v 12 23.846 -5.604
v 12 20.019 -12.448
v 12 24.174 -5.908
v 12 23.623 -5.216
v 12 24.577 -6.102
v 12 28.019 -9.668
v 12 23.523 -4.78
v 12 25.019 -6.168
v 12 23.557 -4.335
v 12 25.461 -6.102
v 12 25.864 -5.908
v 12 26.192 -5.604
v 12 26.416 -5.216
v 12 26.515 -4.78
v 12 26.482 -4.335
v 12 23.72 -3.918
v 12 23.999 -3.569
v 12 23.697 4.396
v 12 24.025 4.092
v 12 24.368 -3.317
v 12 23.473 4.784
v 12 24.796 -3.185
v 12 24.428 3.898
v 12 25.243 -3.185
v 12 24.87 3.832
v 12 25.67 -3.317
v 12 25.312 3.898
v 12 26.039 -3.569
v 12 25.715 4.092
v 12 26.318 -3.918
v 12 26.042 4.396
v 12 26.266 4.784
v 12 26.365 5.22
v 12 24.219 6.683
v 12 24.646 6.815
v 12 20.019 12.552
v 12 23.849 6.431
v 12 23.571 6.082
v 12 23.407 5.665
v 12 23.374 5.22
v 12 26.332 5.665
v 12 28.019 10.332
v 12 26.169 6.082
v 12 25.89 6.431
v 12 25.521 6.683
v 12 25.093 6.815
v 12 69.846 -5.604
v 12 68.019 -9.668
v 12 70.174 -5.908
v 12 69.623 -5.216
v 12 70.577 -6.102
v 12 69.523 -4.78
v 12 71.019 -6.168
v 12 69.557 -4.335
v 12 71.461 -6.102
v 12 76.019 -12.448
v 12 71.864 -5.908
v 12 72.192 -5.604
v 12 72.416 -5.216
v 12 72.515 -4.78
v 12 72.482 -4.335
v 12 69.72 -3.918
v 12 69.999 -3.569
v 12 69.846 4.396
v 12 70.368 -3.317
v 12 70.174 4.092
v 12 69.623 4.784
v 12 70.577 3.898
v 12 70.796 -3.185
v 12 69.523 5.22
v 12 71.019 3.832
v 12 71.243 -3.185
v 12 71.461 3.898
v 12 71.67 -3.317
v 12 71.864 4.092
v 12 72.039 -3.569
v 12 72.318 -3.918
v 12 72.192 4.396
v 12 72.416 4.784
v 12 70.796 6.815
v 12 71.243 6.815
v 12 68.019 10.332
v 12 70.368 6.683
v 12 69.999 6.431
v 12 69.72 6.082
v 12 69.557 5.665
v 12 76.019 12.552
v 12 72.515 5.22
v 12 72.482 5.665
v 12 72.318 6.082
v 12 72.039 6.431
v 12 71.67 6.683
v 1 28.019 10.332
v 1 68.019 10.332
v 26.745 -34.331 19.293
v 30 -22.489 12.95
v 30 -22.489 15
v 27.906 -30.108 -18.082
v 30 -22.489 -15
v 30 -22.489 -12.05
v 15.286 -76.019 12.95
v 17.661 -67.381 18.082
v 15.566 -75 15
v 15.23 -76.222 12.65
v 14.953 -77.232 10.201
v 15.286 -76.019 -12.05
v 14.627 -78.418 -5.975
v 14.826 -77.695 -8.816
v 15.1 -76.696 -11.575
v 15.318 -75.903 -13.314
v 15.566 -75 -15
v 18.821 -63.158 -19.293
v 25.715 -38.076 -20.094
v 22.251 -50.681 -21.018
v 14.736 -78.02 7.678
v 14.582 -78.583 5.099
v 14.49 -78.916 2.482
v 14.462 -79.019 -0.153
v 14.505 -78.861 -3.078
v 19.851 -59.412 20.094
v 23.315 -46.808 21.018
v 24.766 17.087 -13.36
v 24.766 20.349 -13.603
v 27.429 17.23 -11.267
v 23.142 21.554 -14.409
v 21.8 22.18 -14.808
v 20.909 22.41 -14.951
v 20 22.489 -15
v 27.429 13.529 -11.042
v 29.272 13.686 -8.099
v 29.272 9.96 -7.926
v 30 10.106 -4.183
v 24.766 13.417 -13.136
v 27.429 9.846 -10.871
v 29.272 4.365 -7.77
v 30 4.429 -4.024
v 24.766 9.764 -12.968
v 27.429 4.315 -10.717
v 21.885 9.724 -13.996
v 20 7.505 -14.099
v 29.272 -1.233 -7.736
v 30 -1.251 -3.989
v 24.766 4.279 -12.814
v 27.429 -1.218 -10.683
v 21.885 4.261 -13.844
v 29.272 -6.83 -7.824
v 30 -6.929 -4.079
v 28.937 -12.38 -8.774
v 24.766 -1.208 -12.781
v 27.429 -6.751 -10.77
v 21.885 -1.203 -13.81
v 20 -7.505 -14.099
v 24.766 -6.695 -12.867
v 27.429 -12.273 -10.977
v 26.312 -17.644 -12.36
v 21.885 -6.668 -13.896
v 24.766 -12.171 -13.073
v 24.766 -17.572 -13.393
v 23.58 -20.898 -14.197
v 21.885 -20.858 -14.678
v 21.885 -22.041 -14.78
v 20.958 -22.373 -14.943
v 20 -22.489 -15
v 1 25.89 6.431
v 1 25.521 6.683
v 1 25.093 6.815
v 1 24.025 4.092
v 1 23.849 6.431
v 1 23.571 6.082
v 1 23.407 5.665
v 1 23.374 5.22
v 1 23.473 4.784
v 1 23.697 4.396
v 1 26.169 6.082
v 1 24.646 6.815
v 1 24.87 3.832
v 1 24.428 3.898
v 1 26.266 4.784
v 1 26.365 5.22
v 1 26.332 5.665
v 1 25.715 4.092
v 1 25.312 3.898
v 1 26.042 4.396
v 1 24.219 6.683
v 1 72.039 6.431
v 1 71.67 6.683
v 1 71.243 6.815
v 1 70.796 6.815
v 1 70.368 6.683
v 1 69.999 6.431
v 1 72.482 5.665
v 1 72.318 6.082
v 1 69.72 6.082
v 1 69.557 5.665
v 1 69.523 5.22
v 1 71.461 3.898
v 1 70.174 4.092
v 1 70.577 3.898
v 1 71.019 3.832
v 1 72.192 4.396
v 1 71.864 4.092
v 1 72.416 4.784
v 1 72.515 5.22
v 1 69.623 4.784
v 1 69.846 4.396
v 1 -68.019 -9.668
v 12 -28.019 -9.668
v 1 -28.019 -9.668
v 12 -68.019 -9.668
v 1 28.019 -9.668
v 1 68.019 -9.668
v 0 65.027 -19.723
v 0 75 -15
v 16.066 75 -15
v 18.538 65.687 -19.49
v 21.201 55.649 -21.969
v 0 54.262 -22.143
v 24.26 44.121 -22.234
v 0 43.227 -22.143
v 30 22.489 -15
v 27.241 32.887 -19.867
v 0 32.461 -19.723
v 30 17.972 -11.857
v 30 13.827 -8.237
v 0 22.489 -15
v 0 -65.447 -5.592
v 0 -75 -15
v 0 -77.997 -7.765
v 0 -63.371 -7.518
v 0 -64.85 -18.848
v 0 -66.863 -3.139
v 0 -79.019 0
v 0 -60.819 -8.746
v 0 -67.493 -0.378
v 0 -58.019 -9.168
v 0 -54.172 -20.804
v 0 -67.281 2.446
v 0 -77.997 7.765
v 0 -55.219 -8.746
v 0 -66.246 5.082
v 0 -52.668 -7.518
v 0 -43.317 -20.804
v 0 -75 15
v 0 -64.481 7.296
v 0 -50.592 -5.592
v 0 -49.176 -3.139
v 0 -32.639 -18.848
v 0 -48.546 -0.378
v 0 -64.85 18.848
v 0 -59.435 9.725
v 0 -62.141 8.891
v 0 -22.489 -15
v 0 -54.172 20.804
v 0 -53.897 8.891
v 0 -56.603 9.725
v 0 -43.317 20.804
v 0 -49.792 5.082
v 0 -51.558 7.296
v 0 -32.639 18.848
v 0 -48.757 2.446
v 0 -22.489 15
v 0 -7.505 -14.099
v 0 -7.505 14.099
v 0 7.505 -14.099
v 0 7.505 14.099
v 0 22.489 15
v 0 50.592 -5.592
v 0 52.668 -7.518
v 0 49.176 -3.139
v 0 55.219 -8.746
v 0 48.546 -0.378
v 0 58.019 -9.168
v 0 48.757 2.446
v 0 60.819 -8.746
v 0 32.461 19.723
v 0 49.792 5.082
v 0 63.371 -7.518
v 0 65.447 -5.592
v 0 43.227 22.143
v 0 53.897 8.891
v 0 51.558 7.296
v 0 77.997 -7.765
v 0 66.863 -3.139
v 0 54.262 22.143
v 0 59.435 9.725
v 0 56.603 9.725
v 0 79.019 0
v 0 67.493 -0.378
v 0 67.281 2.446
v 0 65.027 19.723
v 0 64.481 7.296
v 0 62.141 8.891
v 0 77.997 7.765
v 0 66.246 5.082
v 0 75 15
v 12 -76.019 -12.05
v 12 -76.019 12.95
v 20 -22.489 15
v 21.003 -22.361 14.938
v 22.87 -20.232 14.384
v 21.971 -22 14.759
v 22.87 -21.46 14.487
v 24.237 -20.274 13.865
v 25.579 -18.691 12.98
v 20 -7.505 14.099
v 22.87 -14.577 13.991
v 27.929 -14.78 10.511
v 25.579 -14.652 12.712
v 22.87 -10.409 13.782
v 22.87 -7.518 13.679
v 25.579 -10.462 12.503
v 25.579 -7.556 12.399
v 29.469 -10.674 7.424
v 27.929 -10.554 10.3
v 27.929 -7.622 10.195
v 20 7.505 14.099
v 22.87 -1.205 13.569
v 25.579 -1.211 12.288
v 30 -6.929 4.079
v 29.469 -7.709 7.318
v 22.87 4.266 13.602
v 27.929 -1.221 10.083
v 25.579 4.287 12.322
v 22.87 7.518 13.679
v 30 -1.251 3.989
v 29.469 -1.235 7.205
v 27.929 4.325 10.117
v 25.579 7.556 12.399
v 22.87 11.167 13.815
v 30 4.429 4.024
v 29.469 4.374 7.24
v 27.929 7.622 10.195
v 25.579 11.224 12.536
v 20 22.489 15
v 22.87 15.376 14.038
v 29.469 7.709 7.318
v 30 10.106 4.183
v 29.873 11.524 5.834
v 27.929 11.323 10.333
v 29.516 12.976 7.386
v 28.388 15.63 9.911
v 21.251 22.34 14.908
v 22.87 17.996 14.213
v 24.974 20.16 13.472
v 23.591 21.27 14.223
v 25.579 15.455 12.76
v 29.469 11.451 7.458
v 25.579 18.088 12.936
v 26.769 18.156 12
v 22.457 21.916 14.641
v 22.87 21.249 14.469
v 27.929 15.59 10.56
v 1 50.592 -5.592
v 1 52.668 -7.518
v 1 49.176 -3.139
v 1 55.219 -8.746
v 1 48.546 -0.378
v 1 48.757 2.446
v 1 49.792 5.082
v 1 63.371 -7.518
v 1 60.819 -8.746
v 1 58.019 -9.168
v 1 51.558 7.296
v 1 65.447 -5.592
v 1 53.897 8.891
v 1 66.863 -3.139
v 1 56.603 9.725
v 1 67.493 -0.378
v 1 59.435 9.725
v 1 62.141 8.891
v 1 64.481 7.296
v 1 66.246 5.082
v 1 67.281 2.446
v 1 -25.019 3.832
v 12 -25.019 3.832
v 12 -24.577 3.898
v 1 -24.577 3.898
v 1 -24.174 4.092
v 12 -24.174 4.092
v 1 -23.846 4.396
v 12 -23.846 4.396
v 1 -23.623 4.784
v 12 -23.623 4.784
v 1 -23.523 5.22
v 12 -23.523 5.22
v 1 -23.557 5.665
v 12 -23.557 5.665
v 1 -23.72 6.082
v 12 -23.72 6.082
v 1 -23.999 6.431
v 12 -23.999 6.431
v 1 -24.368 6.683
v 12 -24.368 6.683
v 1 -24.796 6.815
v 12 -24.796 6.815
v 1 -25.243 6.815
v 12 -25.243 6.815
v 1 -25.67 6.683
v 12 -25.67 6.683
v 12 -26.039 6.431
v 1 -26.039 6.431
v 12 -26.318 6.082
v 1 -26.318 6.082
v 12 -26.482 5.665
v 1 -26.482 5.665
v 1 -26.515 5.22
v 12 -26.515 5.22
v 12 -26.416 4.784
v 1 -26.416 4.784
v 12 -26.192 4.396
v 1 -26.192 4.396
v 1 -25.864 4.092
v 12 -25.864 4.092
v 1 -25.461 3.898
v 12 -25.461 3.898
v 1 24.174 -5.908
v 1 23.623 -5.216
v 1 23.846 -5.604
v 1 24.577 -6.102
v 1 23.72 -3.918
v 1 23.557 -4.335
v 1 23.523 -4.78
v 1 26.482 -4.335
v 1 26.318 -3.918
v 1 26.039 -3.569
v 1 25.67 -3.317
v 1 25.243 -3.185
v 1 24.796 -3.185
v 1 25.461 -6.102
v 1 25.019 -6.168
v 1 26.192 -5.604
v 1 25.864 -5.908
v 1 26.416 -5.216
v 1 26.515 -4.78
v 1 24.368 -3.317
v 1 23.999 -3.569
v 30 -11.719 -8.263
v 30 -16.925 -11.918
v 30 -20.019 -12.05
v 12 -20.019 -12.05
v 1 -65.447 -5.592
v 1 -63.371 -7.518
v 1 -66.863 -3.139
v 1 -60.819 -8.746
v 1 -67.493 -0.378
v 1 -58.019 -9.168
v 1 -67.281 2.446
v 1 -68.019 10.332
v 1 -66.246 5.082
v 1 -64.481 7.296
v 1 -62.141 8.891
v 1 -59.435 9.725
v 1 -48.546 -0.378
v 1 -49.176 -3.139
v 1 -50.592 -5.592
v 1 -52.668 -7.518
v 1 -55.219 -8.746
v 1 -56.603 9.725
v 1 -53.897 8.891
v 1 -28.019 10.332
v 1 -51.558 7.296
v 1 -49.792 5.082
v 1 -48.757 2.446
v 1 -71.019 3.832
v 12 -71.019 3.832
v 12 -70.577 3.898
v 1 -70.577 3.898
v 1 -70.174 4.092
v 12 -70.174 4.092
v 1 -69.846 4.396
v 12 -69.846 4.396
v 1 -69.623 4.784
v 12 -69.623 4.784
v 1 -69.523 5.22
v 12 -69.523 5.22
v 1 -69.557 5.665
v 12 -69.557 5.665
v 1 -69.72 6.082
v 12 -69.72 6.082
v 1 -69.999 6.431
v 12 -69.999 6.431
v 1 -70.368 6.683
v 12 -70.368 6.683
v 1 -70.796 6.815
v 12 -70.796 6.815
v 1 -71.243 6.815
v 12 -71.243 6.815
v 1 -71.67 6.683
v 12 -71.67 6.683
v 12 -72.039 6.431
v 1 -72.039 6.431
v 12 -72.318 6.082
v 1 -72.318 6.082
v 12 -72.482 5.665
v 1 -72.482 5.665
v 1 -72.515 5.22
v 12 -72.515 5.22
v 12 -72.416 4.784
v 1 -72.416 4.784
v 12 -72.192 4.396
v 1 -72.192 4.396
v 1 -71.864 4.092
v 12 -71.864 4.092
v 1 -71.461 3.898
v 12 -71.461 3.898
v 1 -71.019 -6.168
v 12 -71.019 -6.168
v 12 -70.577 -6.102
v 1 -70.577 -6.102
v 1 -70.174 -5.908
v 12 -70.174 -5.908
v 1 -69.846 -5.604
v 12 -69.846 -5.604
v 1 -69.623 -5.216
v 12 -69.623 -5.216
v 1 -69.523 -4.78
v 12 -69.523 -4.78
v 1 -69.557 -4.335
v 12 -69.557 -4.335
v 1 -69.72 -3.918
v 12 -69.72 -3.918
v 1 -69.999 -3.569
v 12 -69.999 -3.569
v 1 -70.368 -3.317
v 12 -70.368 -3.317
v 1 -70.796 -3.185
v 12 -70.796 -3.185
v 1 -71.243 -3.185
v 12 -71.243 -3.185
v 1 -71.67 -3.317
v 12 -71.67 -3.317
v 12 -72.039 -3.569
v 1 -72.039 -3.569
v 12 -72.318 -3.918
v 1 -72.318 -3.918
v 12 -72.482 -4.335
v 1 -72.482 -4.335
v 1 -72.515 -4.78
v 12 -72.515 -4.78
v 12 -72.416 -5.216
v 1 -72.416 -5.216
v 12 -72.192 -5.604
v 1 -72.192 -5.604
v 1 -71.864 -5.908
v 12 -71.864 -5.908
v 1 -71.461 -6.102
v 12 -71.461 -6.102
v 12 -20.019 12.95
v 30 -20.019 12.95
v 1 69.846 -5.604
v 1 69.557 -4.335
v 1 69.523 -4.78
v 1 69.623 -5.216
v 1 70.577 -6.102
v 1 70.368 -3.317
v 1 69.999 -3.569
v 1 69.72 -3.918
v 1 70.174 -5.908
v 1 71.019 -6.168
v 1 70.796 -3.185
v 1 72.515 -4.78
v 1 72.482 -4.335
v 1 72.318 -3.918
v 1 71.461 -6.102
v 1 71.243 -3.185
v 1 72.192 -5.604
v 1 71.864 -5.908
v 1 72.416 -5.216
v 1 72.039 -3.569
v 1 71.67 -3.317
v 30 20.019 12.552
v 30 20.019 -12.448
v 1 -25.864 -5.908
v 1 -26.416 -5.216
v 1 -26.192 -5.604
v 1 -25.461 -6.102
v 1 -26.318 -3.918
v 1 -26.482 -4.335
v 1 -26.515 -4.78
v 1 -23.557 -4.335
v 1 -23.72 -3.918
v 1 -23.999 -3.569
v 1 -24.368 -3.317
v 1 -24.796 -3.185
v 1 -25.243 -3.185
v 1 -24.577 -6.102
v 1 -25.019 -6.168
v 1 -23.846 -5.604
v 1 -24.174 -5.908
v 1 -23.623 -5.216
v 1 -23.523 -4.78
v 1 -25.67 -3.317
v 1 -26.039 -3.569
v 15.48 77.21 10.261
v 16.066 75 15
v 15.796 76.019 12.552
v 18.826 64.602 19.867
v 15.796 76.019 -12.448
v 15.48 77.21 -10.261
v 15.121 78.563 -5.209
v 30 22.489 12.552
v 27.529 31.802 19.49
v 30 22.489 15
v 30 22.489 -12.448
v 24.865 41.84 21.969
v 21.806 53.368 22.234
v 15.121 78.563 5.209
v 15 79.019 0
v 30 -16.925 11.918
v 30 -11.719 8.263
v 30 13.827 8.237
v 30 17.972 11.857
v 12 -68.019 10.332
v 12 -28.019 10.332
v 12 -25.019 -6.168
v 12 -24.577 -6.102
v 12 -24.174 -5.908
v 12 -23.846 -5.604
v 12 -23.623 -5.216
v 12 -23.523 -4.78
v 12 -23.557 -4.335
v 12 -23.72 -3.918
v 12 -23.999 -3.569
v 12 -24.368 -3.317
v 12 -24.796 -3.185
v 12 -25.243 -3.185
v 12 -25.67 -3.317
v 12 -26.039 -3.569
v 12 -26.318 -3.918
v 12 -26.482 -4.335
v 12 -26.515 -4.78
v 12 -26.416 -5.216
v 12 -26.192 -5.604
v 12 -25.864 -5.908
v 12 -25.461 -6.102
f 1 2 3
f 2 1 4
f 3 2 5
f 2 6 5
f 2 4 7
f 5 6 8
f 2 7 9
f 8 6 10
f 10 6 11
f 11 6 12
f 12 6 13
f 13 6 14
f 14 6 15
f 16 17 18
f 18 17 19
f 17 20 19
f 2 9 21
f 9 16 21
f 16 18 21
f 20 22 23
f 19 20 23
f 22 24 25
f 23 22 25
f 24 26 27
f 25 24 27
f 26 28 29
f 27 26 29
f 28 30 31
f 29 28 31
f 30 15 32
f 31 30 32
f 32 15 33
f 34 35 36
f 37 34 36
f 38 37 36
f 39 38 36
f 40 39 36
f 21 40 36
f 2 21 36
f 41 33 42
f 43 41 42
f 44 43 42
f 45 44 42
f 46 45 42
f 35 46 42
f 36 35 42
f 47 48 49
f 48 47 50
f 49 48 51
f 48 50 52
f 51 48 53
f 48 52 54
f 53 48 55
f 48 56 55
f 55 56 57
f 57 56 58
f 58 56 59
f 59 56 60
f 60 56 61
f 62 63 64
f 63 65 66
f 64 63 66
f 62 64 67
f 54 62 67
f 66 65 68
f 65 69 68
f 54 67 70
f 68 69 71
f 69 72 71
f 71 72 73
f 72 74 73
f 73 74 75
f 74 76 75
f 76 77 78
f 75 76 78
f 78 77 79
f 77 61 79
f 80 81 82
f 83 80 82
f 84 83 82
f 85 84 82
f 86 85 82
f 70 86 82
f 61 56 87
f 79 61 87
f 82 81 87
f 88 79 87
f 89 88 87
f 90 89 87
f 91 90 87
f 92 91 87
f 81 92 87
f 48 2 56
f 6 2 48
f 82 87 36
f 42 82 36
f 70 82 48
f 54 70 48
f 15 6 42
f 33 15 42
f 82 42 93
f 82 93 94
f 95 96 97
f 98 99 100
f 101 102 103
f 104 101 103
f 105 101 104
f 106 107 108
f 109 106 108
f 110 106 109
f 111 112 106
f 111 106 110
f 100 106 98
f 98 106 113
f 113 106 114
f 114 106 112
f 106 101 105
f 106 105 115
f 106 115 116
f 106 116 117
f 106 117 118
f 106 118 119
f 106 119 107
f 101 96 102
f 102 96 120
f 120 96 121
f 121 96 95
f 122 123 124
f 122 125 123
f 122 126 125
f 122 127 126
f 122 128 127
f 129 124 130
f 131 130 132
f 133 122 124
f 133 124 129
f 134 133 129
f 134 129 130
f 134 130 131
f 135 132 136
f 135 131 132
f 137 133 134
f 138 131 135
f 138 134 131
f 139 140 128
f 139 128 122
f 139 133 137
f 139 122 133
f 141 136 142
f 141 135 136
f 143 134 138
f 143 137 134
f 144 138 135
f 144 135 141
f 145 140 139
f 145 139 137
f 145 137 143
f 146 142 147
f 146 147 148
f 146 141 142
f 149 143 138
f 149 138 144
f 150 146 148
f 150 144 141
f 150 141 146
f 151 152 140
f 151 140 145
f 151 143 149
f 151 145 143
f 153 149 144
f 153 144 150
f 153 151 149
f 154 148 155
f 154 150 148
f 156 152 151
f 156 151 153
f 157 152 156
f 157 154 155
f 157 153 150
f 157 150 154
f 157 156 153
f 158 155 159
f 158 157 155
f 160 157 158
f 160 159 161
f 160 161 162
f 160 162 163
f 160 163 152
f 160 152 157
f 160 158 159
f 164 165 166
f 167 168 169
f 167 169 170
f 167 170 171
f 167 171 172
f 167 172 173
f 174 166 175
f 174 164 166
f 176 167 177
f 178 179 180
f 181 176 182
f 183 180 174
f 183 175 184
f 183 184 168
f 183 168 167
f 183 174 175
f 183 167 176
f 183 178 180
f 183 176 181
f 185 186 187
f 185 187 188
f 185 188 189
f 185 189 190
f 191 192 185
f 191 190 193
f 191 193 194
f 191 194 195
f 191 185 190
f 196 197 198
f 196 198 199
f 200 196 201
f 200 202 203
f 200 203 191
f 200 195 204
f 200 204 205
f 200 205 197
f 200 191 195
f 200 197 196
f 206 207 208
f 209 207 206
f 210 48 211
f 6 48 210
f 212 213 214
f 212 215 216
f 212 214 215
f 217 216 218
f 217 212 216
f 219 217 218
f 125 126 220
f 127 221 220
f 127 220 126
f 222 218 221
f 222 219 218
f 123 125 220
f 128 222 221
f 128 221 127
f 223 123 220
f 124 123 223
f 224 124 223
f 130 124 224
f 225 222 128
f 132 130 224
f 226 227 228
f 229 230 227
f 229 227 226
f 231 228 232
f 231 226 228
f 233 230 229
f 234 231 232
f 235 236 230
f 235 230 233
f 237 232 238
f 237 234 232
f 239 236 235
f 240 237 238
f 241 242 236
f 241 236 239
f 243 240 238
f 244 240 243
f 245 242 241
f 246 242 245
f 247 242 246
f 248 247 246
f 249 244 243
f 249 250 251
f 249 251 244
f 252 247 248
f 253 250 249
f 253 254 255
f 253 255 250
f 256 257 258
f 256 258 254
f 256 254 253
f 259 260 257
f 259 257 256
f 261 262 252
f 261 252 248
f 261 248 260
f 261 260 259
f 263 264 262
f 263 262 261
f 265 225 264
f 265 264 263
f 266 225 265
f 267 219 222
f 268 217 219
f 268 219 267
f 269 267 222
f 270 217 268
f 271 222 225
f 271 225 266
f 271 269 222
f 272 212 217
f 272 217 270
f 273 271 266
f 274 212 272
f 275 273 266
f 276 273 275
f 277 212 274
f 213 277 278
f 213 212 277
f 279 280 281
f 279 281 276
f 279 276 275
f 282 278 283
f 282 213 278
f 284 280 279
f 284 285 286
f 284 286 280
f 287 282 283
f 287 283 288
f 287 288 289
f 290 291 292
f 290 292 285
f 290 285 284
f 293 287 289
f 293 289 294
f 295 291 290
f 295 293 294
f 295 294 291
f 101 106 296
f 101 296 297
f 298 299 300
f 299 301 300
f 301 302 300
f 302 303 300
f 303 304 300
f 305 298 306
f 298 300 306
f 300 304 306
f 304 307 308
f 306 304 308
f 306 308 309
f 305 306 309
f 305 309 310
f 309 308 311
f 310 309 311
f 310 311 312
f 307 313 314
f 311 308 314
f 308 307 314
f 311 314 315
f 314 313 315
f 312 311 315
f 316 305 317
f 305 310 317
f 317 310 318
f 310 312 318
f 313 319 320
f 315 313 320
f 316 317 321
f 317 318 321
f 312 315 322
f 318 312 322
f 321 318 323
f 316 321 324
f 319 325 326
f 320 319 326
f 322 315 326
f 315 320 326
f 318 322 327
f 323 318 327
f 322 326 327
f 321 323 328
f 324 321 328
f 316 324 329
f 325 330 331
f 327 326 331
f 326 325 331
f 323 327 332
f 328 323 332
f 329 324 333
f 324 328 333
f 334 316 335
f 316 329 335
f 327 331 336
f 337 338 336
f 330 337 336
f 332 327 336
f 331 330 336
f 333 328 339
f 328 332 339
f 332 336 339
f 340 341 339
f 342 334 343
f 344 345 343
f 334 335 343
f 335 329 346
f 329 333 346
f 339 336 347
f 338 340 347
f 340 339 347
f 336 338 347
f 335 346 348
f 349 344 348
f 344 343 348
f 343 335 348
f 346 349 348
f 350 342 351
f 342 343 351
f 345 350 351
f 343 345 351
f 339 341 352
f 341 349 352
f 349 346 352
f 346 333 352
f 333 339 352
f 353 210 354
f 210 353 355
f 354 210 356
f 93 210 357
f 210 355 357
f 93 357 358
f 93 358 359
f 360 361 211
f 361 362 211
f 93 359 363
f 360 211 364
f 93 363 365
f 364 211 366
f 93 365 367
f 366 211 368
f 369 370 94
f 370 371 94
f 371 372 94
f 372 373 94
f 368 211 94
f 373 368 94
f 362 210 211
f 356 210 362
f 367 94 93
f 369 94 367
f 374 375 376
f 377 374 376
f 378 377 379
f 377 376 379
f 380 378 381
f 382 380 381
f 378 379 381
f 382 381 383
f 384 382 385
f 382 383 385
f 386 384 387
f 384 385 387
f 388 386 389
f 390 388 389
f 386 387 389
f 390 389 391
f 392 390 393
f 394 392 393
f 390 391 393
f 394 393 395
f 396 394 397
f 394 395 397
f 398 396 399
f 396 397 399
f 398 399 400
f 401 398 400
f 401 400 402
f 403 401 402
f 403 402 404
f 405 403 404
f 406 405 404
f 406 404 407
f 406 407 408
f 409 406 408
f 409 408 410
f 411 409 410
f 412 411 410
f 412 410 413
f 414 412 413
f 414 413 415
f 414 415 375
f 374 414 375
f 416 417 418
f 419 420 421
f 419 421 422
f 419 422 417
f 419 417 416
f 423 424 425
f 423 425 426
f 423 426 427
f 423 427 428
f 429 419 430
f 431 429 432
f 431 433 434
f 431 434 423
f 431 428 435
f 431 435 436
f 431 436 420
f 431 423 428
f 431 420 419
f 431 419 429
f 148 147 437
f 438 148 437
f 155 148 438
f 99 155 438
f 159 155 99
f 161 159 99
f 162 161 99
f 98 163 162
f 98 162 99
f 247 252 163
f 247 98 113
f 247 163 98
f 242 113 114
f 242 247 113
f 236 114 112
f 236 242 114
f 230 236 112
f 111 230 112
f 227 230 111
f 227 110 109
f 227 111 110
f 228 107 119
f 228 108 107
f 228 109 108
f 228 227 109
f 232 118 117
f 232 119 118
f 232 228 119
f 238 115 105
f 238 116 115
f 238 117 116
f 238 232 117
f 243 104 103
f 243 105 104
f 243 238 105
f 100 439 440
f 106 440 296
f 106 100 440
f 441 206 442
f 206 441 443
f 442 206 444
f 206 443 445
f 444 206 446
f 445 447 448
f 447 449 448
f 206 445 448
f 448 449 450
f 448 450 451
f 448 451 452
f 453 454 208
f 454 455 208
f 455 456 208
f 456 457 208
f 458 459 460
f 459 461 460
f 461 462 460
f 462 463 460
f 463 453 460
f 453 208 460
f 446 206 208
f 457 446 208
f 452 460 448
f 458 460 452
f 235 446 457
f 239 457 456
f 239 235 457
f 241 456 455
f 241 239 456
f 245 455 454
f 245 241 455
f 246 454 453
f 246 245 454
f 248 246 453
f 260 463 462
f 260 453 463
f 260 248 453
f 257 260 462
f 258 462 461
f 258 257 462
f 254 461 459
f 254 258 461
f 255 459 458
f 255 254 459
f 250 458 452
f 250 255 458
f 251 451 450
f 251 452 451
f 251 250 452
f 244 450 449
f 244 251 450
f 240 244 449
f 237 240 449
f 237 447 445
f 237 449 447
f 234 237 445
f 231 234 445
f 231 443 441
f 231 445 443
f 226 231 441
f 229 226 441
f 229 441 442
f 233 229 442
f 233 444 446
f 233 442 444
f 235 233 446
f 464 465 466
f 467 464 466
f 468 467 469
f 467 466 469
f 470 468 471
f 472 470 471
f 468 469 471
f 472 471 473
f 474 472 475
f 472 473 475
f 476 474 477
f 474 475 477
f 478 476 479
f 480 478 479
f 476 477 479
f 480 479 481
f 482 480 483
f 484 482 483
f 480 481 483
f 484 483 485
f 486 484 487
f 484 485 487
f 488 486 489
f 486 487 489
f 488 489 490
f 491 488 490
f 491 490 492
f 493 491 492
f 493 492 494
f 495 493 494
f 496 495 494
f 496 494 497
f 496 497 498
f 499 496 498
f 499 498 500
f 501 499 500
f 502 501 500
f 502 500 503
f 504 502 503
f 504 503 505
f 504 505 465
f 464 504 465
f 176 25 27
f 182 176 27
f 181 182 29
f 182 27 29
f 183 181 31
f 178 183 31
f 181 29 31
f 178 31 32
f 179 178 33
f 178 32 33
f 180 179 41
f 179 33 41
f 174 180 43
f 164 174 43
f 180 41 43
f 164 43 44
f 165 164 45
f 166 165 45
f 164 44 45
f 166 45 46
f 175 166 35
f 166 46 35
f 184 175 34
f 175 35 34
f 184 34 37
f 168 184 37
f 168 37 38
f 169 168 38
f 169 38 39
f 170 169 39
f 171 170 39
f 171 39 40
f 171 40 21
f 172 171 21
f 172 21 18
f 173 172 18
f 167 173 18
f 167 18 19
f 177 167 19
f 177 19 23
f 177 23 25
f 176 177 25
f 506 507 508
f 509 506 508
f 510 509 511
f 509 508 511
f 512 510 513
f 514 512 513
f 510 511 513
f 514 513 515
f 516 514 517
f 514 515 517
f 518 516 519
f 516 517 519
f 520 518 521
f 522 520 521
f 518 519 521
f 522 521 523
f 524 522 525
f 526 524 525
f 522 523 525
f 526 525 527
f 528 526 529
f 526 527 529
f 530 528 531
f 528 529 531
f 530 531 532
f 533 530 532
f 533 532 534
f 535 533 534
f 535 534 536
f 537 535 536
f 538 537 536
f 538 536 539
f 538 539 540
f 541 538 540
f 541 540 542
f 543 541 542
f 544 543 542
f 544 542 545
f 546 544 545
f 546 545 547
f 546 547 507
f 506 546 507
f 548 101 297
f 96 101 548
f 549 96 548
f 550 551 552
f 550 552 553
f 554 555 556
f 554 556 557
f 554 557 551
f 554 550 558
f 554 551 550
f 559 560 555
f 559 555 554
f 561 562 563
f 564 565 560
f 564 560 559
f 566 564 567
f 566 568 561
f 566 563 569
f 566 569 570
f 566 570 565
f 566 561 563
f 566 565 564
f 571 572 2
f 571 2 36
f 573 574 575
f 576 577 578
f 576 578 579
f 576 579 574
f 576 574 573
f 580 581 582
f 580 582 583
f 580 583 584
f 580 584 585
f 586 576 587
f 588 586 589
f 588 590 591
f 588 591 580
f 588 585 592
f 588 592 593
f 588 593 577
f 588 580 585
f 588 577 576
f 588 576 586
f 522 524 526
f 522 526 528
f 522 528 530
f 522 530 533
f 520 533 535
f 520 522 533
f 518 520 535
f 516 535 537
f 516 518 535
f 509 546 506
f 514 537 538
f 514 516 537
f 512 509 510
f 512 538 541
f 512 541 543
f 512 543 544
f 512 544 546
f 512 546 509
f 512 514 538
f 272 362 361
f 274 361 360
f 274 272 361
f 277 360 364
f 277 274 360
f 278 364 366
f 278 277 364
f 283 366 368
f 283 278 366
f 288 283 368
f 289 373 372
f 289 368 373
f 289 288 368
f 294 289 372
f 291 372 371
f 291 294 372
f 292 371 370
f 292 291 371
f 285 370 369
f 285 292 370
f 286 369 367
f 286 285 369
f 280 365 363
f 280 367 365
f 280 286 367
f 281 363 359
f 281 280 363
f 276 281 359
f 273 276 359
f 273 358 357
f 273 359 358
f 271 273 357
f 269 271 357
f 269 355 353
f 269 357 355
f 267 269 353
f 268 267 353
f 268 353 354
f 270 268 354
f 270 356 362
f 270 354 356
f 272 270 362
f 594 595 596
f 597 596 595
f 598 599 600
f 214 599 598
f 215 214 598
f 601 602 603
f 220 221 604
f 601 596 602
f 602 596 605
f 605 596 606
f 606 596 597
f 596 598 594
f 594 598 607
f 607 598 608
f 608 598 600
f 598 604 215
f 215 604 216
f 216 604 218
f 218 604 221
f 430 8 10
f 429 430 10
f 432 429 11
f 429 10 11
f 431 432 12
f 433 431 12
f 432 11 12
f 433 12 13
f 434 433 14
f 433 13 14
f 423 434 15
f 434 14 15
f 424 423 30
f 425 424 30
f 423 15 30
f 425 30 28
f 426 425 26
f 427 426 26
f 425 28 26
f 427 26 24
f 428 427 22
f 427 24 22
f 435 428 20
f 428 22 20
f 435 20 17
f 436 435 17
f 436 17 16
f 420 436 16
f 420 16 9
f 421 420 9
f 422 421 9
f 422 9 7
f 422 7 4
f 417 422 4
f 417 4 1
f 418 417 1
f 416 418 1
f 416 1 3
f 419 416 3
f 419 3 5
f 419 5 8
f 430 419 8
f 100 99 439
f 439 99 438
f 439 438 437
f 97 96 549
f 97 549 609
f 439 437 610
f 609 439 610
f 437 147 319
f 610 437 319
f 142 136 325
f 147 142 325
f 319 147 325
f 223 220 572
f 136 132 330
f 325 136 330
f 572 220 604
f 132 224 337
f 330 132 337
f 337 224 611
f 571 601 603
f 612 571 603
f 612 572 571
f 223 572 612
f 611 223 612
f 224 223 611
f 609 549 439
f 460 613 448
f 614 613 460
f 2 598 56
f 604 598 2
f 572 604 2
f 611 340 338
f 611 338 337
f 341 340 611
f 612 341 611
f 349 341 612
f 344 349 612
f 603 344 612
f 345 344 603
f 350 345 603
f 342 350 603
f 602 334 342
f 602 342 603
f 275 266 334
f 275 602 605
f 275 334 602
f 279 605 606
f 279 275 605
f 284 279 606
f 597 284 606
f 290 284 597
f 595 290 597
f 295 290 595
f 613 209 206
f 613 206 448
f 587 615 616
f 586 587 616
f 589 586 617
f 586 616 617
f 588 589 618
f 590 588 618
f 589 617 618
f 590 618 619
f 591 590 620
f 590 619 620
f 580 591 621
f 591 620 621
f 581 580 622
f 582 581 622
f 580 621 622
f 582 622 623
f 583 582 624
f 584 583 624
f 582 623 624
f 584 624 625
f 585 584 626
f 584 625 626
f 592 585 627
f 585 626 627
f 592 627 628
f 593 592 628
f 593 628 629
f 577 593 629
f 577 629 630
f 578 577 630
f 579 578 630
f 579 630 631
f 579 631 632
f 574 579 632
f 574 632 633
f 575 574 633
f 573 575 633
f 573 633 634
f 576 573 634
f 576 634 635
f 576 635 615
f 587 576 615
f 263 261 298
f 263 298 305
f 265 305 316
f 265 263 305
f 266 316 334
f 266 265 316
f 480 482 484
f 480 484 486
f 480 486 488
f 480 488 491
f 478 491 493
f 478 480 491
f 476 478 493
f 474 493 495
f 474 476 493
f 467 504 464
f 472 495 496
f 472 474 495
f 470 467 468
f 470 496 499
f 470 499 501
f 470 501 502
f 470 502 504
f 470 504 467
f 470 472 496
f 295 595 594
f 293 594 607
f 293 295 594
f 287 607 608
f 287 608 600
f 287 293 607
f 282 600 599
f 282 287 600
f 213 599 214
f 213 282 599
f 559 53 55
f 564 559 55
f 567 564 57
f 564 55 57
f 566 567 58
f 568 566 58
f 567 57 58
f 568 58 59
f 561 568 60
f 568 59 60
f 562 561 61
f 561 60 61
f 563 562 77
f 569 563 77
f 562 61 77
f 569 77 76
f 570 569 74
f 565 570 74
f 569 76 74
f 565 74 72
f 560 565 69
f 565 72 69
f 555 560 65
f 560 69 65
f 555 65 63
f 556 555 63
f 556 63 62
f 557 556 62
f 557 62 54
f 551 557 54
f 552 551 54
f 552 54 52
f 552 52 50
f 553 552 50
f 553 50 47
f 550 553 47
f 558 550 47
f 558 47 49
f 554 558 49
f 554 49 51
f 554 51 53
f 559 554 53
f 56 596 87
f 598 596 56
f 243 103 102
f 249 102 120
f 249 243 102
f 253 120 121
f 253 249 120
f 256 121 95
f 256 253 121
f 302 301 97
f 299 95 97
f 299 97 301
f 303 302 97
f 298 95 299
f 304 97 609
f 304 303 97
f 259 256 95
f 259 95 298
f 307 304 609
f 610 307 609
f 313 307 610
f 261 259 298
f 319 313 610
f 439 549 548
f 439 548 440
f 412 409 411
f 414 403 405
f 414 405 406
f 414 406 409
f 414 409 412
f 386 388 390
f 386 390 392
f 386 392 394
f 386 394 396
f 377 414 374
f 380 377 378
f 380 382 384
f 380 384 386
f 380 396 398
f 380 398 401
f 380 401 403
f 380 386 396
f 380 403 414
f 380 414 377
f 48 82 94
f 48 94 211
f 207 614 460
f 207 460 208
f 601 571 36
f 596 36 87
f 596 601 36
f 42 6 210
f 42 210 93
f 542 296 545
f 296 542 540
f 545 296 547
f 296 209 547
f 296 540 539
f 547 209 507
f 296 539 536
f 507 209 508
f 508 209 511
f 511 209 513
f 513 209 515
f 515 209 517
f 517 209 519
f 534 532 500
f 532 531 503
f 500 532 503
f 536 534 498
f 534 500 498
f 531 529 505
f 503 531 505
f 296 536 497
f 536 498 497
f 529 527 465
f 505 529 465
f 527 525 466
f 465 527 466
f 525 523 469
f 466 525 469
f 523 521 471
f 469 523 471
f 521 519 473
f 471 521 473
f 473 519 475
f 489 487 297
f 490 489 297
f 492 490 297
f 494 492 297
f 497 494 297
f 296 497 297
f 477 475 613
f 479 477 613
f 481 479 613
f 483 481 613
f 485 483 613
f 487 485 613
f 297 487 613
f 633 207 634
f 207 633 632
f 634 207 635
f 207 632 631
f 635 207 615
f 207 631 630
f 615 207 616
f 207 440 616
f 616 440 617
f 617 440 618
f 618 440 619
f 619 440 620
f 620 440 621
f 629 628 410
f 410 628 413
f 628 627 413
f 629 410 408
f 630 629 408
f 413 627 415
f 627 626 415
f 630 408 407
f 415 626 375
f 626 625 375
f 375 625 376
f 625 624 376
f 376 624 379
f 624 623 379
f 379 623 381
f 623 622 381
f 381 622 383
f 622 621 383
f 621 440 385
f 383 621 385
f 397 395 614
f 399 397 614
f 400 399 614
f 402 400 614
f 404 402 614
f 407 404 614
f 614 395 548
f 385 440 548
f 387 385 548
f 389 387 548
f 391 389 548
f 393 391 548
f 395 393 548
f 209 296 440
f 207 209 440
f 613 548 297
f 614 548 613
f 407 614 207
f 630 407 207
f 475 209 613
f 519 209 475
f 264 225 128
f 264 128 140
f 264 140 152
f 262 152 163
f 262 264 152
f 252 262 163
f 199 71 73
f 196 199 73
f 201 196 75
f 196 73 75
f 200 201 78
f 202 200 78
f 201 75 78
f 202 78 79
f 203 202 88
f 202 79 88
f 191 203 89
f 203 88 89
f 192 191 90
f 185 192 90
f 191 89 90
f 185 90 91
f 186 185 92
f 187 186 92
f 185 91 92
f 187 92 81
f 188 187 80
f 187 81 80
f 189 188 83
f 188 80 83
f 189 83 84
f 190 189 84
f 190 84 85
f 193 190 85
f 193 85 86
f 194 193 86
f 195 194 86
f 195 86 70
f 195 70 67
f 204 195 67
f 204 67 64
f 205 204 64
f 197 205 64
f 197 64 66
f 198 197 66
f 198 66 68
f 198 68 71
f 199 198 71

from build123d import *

# Parameters (mm, degrees)
BOSS_EXTRUDE1_DEPTH     = 30
SKETCH2_R               = 1.5000000000000049
SKETCH2_R_2             = 1.500000000000013
SKETCH2_R_3             = 1.5000000000000009
SKETCH2_R_4             = 1.5000000000000004
CUT_EXTRUDE1_DEPTH      = 29
CUT_EXTRUDE2_DEPTH      = 18
CUT_EXTRUDE3_DEPTH      = 40
CUT_EXTRUDE3_DEPTH_BACK = 40
SKETCH5_R               = 9.5
CUT_EXTRUDE4_DEPTH      = 40
FILLET1_R               = 10
FILLET2_R               = 10


with BuildPart() as part:
    # Sketch1 → Boss-Extrude1 (new body)
    with BuildSketch(Plane(origin=(0, 0, 0), x_dir=(0, 0, -1), z_dir=(1, 0, 0))):
        with BuildLine():
            ThreePointArc((14.999999999999988, 22.48862564156887), (13.986468943100135, -3.598e-14), (15, -22.488625641568866))
            ThreePointArc((15, -22.488625641568866), (21.049662737410323, -48.744312820784444), (15.000000000000004, -75.00000000000001))
            ThreePointArc((15.000000000000004, -75.00000000000001), (4.72e-15, -79.01923788646685), (-14.999999999999996, -75.00000000000001))
            ThreePointArc((-14.999999999999996, -75.00000000000001), (-21.049662737410294, -48.74431282078444), (-15.00000000000001, -22.488625641568866))
            ThreePointArc((-15.00000000000001, -22.488625641568866), (-13.986468943100135, 1.189e-14), (-15.00000000000001, 22.488625641568895))
            ThreePointArc((-15.00000000000001, 22.488625641568895), (-22.448397318700515, 48.74431282078445), (-15.000000000000007, 74.99999999999999))
            ThreePointArc((-15.000000000000007, 74.99999999999999), (-1.35e-15, 79.01923788646687), (14.99999999999999, 74.99999999999999))
            ThreePointArc((14.99999999999999, 74.99999999999999), (22.448397318700543, 48.744312820784415), (14.999999999999988, 22.48862564156887))
        make_face()
    extrude(amount=BOSS_EXTRUDE1_DEPTH)

    # Sketch2 → Cut-Extrude1 (cut)
    with BuildSketch(Plane(origin=(30, 0, 0), x_dir=(0, 0, -1), z_dir=(1, 0, 0))):
        with Locations((4.6684040574518, 71.01923788646675)):
            Circle(SKETCH2_R)
        with Locations((-5.331595942548199, 71.01923788646673)):
            Circle(SKETCH2_R_2)
        with Locations((4.6684040574518, 25.01923788646677)):
            Circle(SKETCH2_R_3)
        with Locations((-5.331595942548199, 24.86968442746252)):
            Circle(SKETCH2_R_4)
        with Locations((4.6684040574518, -25.019237886466854)):
            Circle(SKETCH2_R_3)
        with Locations((-5.331595942548199, -25.01923788646685)):
            Circle(SKETCH2_R_3)
        with Locations((4.6684040574518, -71.01923788646685)):
            Circle(SKETCH2_R_3)
        with Locations((-5.331595942548199, -71.01923788646685)):
            Circle(SKETCH2_R_3)
        Polygon((-10.3315959425482, 68.01923788646677), (9.6684040574518, 68.01923788646677), (9.668404057451806, 28.01923788646677), (-10.331595942548194, 28.019237886466765), align=None)
        Polygon((-10.331595942548196, -28.019237886466858), (9.668404057451804, -28.019237886466854), (9.66840405745181, -68.01923788646685), (-10.33159594254819, -68.01923788646685), align=None)
    extrude(amount=-CUT_EXTRUDE1_DEPTH, mode=Mode.SUBTRACT)

    # Sketch3 → Cut-Extrude2 (cut)
    with BuildSketch(Plane(origin=(30, 0, 0), x_dir=(0, 0, -1), z_dir=(1, 0, 0))):
        Polygon((-12.551602681299467, 76.01923788646684), (12.44839731870053, 76.01923788646684), (12.448397318700541, 20.019237886466833), (-12.55160268129946, 20.019237886466833), align=None)
        Polygon((-12.950337262589732, -20.01923788646686), (12.04966273741027, -20.01923788646686), (12.049662737410275, -76.01923788646687), (-12.950337262589725, -76.01923788646687), align=None)
    extrude(amount=-CUT_EXTRUDE2_DEPTH, mode=Mode.SUBTRACT)

    # Sketch4 → Cut-Extrude3 (cut, two sides: drawn at the far end of the back side and taken through both)
    with BuildSketch(Plane.XY.offset(-CUT_EXTRUDE3_DEPTH_BACK)):
        Polygon((15, 79.01923788646681), (30, 22.48862564156887), (30, -22.488625641568873), (14.279552603766648, -79.68148202341017), (43.09744845310124, -79.68148202341017), (43.09744845310124, 80.44995924605905), align=None)
    extrude(amount=CUT_EXTRUDE3_DEPTH + CUT_EXTRUDE3_DEPTH_BACK, mode=Mode.SUBTRACT)

    # Sketch5 → Cut-Extrude4 (cut)
    with BuildSketch(Plane(origin=(0, 0, 0), x_dir=(0, 0, -1), z_dir=(1, 0, 0))):
        with Locations((-0.33159594254819796, 58.01923788646677)):
            Circle(SKETCH5_R)
        with Locations((-0.331595942548191, -58.019237886466854)):
            Circle(SKETCH5_R)
    extrude(amount=CUT_EXTRUDE4_DEPTH, mode=Mode.SUBTRACT)

    # Fillet1
    # the kernel refuses this fillet: 10 mm, written as the material it takes off along each edge
    with BuildSketch(Plane(origin=(30, 7.017e-14, -263.9864689431014), x_dir=(0, 0.1889343030386976, 0.9819897296485751), z_dir=(0, 0.9819897296485751, -0.1889343030386976))) as fillet1_piece_1_section:
        with BuildLine():
            CenterArc((250.00000000000125 + FILLET1_R, -FILLET1_R), FILLET1_R, 90, 90)
            Line((250.00000000000125 + FILLET1_R, 0), (250.00000000000125, 0))
            Line((250.00000000000125, 0), (250.00000000000125, -FILLET1_R))
        make_face()
    fillet1_piece_1 = revolve(axis=Axis((30, 7.017e-14, -263.9864689431014), (1, 0, 0)), revolution_arc=21.781195760755132, mode=Mode.PRIVATE)
    fillet1_piece_1 = fillet1_piece_1 - Plane(origin=(27.494567227966037, 48.74431282078443, 27.551602681299116), x_dir=(0, 0.5251137435843147, -0.851032053625988), z_dir=(-1, 0, 0)) * Cylinder(49.99999999999966, 1041, mode=Mode.PRIVATE)
    fillet1_piece_1 = fillet1_piece_1 - Plane(origin=(27.494567227966037, -48.744312820784444, 38.95033726258946), x_dir=(0, 0.4375947863202612, -0.8991722877098276), z_dir=(-1, 0, 0)) * Cylinder(59.99999999999978, 1041, mode=Mode.PRIVATE)
    add(fillet1_piece_1, mode=Mode.SUBTRACT)

    # Fillet2
    fillet2_edges = [part.edges().sort_by_distance(p)[0] for p in [
        (30, 1.066e-14, 13.986468943100135),
    ]]
    fillet(fillet2_edges, radius=FILLET2_R)


solid = part.part
